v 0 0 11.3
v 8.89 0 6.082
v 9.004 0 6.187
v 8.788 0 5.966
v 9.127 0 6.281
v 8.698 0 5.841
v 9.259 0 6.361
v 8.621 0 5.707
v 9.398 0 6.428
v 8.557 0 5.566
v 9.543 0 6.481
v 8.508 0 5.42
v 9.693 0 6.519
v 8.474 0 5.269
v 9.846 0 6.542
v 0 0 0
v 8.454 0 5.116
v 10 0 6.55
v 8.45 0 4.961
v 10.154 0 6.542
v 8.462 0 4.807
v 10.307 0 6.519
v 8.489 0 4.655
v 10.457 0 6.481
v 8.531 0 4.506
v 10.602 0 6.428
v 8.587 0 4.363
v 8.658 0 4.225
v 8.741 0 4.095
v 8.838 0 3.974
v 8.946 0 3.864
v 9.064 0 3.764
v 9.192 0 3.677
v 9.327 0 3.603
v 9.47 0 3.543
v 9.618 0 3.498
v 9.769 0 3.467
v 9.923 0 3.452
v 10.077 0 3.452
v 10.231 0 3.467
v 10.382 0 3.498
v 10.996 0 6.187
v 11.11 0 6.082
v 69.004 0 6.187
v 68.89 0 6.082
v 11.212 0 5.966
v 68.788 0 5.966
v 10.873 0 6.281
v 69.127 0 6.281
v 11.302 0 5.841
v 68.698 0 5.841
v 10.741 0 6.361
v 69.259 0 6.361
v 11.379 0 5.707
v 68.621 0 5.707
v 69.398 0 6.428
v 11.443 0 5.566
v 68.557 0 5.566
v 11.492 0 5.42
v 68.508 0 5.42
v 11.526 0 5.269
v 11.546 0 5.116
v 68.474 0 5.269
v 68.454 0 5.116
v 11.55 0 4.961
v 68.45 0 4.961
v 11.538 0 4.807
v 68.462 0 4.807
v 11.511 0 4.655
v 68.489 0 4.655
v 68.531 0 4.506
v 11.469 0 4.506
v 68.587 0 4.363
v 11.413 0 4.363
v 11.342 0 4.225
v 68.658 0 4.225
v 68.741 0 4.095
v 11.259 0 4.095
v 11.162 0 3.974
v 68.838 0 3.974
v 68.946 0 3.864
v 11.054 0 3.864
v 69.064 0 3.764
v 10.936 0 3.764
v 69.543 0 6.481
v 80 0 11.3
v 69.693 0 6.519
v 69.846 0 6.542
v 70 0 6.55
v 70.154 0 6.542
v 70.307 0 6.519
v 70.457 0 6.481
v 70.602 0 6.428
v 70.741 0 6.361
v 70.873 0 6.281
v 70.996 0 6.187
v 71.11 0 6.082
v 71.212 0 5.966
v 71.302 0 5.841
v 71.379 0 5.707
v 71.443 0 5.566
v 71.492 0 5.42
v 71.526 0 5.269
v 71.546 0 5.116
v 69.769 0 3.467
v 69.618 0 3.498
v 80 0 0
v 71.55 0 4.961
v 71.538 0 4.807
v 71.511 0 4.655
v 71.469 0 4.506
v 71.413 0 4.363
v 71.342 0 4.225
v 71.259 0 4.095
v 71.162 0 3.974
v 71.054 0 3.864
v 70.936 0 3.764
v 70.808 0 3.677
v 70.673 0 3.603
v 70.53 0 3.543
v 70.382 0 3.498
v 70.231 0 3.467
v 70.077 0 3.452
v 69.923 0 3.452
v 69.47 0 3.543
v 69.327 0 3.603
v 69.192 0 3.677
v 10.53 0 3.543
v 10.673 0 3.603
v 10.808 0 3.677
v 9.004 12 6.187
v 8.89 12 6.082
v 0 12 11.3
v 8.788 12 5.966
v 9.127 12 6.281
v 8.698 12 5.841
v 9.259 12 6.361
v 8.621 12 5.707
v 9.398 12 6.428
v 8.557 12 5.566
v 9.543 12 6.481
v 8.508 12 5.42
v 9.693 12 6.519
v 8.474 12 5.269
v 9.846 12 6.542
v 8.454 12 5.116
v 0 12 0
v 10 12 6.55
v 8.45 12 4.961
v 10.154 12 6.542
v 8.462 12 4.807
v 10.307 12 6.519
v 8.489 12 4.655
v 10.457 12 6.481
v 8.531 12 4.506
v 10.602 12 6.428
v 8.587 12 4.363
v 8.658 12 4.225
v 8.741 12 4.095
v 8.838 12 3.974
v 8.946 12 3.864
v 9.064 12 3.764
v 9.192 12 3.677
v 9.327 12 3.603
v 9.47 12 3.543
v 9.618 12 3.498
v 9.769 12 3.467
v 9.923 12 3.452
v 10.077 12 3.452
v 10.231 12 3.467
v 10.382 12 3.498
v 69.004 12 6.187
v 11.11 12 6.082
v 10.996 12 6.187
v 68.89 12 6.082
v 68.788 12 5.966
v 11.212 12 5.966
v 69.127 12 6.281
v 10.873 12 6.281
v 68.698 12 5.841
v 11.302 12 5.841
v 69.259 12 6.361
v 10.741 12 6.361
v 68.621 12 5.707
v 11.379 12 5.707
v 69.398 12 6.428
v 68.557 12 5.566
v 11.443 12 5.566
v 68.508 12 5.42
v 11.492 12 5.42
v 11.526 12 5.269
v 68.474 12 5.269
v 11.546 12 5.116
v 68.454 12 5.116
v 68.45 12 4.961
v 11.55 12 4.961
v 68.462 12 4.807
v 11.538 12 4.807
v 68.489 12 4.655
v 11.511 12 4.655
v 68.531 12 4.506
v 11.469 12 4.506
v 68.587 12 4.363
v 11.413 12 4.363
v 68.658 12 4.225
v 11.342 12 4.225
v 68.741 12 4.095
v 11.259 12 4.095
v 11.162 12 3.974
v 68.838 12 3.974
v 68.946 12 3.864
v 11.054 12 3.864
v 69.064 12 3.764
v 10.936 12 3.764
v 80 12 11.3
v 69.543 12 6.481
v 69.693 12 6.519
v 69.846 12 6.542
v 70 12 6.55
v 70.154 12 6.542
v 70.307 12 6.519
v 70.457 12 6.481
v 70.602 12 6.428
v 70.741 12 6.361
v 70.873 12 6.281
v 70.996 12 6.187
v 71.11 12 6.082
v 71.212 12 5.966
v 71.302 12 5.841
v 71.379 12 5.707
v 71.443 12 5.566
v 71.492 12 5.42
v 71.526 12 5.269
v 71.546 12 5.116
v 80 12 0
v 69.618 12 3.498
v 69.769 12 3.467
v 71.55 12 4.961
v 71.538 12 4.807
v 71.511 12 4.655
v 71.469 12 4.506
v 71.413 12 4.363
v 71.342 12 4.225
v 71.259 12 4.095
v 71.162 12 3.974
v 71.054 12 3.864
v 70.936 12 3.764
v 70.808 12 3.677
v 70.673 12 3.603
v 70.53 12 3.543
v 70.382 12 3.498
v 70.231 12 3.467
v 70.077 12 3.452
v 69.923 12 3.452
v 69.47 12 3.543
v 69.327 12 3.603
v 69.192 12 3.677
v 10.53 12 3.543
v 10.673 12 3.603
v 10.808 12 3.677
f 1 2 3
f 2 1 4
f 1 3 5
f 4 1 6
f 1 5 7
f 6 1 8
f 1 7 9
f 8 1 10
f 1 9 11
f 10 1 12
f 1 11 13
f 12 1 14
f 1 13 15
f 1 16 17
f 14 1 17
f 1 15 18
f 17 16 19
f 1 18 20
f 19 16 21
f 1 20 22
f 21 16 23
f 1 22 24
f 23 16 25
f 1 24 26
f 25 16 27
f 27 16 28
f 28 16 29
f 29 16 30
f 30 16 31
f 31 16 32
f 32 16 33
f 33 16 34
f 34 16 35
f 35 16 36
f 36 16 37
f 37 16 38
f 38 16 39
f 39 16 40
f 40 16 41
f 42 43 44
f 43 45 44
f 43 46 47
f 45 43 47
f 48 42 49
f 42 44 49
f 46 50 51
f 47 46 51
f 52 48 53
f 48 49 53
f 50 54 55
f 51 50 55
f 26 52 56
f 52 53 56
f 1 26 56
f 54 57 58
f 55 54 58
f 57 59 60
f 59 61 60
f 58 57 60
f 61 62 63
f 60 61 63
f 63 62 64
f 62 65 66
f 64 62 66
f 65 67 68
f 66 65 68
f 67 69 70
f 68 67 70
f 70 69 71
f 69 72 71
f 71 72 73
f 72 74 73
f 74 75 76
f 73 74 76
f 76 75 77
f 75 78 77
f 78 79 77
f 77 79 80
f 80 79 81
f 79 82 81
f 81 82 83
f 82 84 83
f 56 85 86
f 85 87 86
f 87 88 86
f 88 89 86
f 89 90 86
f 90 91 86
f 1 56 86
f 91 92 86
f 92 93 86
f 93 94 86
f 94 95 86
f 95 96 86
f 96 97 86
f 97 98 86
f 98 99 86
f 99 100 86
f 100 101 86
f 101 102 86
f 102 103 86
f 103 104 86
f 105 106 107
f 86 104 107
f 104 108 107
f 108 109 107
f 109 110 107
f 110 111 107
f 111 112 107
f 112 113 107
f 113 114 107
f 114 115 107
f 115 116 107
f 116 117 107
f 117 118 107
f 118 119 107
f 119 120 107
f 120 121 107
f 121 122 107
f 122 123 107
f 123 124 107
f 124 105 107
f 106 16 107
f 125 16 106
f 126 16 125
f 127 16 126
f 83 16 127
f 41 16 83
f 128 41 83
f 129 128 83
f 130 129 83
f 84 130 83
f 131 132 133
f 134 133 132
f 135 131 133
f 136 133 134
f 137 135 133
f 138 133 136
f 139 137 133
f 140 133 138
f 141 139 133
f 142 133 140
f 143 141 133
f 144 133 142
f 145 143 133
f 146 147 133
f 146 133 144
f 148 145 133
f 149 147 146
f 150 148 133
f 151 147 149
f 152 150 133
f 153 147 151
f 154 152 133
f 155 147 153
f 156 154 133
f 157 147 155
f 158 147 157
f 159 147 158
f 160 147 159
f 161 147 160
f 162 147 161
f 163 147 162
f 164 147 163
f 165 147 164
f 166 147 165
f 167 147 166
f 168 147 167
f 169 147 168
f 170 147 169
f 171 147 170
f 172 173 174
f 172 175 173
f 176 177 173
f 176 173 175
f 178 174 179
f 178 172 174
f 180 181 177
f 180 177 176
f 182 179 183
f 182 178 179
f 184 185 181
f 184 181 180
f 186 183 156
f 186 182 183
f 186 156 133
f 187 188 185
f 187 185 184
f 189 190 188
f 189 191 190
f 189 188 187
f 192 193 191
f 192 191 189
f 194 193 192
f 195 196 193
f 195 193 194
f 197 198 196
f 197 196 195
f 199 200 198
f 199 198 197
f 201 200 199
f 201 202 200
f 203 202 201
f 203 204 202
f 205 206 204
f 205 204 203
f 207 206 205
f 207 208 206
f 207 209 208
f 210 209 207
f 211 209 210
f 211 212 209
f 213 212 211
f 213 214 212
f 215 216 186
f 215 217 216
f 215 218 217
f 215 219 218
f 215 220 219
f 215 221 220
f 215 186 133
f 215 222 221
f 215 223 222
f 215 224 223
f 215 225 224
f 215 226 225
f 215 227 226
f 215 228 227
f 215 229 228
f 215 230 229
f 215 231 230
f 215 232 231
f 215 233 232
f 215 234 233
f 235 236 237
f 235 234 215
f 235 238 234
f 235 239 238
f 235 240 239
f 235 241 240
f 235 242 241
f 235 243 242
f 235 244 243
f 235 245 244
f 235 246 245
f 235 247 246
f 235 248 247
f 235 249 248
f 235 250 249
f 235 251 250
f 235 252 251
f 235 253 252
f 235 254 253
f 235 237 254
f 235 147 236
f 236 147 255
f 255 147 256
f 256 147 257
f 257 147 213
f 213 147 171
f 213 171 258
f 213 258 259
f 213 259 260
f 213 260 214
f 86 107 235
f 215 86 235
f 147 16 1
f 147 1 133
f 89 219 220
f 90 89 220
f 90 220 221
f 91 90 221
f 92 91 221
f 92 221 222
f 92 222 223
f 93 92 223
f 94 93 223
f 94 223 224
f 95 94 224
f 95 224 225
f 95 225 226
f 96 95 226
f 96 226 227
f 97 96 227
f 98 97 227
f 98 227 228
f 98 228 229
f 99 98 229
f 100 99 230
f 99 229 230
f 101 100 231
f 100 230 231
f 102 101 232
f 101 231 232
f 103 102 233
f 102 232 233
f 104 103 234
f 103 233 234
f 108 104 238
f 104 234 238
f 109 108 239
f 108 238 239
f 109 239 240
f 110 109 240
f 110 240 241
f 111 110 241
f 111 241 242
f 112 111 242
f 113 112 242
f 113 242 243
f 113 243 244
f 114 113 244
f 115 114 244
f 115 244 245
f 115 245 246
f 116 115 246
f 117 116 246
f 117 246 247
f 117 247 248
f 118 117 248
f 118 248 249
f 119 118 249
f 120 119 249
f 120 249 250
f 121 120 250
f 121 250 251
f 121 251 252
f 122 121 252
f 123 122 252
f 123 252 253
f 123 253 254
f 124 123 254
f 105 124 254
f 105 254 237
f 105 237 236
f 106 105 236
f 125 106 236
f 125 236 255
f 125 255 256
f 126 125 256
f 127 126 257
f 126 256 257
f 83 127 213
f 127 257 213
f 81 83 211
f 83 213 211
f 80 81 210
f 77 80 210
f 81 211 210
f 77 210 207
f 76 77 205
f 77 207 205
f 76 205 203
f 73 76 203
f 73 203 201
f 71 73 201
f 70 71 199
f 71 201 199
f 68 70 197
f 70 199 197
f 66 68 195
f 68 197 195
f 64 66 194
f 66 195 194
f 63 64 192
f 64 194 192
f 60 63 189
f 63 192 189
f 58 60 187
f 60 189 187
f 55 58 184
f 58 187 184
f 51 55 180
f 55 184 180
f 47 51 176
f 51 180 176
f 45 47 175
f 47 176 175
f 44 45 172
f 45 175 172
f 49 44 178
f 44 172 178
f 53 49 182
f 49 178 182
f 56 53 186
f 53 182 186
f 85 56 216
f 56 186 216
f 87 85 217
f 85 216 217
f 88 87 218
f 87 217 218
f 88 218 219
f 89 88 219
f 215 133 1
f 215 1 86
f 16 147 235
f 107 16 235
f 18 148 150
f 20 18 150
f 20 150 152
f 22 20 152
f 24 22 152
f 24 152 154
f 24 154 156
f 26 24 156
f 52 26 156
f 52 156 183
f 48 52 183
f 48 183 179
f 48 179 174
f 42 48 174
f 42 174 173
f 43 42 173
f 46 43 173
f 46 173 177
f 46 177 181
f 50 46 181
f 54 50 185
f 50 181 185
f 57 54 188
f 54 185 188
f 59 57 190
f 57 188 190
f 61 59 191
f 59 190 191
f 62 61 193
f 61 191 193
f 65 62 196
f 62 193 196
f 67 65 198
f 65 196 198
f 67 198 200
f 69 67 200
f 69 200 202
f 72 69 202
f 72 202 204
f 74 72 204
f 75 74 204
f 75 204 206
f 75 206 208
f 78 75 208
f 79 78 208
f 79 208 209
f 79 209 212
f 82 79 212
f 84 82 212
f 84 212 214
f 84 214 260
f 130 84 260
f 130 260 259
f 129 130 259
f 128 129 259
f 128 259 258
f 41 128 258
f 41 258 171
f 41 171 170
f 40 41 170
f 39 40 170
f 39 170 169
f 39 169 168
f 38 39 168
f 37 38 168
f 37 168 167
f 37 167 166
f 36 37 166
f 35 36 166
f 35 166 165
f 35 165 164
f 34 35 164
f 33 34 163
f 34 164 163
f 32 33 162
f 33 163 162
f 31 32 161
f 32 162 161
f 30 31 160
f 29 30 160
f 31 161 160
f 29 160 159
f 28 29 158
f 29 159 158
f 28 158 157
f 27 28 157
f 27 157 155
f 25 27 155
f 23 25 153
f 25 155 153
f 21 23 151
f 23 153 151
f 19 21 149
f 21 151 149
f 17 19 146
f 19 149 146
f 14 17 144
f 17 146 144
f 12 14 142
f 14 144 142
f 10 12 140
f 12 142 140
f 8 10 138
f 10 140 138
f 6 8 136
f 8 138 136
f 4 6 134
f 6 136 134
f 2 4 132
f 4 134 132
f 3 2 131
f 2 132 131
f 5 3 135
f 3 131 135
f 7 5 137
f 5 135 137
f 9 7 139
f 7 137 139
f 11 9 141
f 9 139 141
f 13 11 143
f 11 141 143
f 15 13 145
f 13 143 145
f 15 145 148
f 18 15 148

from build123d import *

# Parameters (mm, degrees)
SKETCH_1_W          = 80
SKETCH_1_H          = 12
EXTRUDE_1_DEPTH     = 11.5
CUT_EXTRUDE_1_REACH = 83.708
SKETCH_2_R          = 1.55
SKETCH_3_W          = 80
SKETCH_3_H          = 12
CUT_EXTRUDE_2_DEPTH = 0.2


with BuildPart() as part:
    # 草图1 → 凸台-拉伸1 (new body)
    with BuildSketch(Plane.XY):
        with Locations((40, 6)):
            Rectangle(SKETCH_1_W, SKETCH_1_H)
    extrude(amount=EXTRUDE_1_DEPTH)

    # 草图2 → 切除-拉伸1 (cut, up to next)
    with BuildSketch(Plane(origin=(0, 12, 0), x_dir=(1, 0, 0), z_dir=(0, 1, 0)), mode=Mode.PRIVATE) as cut_extrude_1_sk1:
        with Locations(Location((10, -5, 0), (0, 0, 270))):
            Circle(SKETCH_2_R)
    cut_extrude_1_tool1 = extrude(cut_extrude_1_sk1.sketch, amount=-CUT_EXTRUDE_1_REACH, mode=Mode.PRIVATE) & part.part
    # 草图2 → 切除-拉伸1 (cut, up to next)
    with BuildSketch(Plane(origin=(0, 12, 0), x_dir=(1, 0, 0), z_dir=(0, 1, 0)), mode=Mode.PRIVATE) as cut_extrude_1_sk2:
        with Locations(Location((70, -5, 0), (0, 0, 270))):
            Circle(SKETCH_2_R)
    cut_extrude_1_tool2 = extrude(cut_extrude_1_sk2.sketch, amount=-CUT_EXTRUDE_1_REACH, mode=Mode.PRIVATE) & part.part
    add(cut_extrude_1_tool1.solids().sort_by_distance((10, 12, 5))[0], mode=Mode.SUBTRACT)
    add(cut_extrude_1_tool2.solids().sort_by_distance((70, 12, 5))[0], mode=Mode.SUBTRACT)

    # 草图3 → 切除-拉伸2 (cut)
    with BuildSketch(Plane.XY.offset(11.5)):
        with Locations((40, 6)):
            Rectangle(SKETCH_3_W, SKETCH_3_H)
    extrude(amount=-CUT_EXTRUDE_2_DEPTH, mode=Mode.SUBTRACT)


solid = part.part
